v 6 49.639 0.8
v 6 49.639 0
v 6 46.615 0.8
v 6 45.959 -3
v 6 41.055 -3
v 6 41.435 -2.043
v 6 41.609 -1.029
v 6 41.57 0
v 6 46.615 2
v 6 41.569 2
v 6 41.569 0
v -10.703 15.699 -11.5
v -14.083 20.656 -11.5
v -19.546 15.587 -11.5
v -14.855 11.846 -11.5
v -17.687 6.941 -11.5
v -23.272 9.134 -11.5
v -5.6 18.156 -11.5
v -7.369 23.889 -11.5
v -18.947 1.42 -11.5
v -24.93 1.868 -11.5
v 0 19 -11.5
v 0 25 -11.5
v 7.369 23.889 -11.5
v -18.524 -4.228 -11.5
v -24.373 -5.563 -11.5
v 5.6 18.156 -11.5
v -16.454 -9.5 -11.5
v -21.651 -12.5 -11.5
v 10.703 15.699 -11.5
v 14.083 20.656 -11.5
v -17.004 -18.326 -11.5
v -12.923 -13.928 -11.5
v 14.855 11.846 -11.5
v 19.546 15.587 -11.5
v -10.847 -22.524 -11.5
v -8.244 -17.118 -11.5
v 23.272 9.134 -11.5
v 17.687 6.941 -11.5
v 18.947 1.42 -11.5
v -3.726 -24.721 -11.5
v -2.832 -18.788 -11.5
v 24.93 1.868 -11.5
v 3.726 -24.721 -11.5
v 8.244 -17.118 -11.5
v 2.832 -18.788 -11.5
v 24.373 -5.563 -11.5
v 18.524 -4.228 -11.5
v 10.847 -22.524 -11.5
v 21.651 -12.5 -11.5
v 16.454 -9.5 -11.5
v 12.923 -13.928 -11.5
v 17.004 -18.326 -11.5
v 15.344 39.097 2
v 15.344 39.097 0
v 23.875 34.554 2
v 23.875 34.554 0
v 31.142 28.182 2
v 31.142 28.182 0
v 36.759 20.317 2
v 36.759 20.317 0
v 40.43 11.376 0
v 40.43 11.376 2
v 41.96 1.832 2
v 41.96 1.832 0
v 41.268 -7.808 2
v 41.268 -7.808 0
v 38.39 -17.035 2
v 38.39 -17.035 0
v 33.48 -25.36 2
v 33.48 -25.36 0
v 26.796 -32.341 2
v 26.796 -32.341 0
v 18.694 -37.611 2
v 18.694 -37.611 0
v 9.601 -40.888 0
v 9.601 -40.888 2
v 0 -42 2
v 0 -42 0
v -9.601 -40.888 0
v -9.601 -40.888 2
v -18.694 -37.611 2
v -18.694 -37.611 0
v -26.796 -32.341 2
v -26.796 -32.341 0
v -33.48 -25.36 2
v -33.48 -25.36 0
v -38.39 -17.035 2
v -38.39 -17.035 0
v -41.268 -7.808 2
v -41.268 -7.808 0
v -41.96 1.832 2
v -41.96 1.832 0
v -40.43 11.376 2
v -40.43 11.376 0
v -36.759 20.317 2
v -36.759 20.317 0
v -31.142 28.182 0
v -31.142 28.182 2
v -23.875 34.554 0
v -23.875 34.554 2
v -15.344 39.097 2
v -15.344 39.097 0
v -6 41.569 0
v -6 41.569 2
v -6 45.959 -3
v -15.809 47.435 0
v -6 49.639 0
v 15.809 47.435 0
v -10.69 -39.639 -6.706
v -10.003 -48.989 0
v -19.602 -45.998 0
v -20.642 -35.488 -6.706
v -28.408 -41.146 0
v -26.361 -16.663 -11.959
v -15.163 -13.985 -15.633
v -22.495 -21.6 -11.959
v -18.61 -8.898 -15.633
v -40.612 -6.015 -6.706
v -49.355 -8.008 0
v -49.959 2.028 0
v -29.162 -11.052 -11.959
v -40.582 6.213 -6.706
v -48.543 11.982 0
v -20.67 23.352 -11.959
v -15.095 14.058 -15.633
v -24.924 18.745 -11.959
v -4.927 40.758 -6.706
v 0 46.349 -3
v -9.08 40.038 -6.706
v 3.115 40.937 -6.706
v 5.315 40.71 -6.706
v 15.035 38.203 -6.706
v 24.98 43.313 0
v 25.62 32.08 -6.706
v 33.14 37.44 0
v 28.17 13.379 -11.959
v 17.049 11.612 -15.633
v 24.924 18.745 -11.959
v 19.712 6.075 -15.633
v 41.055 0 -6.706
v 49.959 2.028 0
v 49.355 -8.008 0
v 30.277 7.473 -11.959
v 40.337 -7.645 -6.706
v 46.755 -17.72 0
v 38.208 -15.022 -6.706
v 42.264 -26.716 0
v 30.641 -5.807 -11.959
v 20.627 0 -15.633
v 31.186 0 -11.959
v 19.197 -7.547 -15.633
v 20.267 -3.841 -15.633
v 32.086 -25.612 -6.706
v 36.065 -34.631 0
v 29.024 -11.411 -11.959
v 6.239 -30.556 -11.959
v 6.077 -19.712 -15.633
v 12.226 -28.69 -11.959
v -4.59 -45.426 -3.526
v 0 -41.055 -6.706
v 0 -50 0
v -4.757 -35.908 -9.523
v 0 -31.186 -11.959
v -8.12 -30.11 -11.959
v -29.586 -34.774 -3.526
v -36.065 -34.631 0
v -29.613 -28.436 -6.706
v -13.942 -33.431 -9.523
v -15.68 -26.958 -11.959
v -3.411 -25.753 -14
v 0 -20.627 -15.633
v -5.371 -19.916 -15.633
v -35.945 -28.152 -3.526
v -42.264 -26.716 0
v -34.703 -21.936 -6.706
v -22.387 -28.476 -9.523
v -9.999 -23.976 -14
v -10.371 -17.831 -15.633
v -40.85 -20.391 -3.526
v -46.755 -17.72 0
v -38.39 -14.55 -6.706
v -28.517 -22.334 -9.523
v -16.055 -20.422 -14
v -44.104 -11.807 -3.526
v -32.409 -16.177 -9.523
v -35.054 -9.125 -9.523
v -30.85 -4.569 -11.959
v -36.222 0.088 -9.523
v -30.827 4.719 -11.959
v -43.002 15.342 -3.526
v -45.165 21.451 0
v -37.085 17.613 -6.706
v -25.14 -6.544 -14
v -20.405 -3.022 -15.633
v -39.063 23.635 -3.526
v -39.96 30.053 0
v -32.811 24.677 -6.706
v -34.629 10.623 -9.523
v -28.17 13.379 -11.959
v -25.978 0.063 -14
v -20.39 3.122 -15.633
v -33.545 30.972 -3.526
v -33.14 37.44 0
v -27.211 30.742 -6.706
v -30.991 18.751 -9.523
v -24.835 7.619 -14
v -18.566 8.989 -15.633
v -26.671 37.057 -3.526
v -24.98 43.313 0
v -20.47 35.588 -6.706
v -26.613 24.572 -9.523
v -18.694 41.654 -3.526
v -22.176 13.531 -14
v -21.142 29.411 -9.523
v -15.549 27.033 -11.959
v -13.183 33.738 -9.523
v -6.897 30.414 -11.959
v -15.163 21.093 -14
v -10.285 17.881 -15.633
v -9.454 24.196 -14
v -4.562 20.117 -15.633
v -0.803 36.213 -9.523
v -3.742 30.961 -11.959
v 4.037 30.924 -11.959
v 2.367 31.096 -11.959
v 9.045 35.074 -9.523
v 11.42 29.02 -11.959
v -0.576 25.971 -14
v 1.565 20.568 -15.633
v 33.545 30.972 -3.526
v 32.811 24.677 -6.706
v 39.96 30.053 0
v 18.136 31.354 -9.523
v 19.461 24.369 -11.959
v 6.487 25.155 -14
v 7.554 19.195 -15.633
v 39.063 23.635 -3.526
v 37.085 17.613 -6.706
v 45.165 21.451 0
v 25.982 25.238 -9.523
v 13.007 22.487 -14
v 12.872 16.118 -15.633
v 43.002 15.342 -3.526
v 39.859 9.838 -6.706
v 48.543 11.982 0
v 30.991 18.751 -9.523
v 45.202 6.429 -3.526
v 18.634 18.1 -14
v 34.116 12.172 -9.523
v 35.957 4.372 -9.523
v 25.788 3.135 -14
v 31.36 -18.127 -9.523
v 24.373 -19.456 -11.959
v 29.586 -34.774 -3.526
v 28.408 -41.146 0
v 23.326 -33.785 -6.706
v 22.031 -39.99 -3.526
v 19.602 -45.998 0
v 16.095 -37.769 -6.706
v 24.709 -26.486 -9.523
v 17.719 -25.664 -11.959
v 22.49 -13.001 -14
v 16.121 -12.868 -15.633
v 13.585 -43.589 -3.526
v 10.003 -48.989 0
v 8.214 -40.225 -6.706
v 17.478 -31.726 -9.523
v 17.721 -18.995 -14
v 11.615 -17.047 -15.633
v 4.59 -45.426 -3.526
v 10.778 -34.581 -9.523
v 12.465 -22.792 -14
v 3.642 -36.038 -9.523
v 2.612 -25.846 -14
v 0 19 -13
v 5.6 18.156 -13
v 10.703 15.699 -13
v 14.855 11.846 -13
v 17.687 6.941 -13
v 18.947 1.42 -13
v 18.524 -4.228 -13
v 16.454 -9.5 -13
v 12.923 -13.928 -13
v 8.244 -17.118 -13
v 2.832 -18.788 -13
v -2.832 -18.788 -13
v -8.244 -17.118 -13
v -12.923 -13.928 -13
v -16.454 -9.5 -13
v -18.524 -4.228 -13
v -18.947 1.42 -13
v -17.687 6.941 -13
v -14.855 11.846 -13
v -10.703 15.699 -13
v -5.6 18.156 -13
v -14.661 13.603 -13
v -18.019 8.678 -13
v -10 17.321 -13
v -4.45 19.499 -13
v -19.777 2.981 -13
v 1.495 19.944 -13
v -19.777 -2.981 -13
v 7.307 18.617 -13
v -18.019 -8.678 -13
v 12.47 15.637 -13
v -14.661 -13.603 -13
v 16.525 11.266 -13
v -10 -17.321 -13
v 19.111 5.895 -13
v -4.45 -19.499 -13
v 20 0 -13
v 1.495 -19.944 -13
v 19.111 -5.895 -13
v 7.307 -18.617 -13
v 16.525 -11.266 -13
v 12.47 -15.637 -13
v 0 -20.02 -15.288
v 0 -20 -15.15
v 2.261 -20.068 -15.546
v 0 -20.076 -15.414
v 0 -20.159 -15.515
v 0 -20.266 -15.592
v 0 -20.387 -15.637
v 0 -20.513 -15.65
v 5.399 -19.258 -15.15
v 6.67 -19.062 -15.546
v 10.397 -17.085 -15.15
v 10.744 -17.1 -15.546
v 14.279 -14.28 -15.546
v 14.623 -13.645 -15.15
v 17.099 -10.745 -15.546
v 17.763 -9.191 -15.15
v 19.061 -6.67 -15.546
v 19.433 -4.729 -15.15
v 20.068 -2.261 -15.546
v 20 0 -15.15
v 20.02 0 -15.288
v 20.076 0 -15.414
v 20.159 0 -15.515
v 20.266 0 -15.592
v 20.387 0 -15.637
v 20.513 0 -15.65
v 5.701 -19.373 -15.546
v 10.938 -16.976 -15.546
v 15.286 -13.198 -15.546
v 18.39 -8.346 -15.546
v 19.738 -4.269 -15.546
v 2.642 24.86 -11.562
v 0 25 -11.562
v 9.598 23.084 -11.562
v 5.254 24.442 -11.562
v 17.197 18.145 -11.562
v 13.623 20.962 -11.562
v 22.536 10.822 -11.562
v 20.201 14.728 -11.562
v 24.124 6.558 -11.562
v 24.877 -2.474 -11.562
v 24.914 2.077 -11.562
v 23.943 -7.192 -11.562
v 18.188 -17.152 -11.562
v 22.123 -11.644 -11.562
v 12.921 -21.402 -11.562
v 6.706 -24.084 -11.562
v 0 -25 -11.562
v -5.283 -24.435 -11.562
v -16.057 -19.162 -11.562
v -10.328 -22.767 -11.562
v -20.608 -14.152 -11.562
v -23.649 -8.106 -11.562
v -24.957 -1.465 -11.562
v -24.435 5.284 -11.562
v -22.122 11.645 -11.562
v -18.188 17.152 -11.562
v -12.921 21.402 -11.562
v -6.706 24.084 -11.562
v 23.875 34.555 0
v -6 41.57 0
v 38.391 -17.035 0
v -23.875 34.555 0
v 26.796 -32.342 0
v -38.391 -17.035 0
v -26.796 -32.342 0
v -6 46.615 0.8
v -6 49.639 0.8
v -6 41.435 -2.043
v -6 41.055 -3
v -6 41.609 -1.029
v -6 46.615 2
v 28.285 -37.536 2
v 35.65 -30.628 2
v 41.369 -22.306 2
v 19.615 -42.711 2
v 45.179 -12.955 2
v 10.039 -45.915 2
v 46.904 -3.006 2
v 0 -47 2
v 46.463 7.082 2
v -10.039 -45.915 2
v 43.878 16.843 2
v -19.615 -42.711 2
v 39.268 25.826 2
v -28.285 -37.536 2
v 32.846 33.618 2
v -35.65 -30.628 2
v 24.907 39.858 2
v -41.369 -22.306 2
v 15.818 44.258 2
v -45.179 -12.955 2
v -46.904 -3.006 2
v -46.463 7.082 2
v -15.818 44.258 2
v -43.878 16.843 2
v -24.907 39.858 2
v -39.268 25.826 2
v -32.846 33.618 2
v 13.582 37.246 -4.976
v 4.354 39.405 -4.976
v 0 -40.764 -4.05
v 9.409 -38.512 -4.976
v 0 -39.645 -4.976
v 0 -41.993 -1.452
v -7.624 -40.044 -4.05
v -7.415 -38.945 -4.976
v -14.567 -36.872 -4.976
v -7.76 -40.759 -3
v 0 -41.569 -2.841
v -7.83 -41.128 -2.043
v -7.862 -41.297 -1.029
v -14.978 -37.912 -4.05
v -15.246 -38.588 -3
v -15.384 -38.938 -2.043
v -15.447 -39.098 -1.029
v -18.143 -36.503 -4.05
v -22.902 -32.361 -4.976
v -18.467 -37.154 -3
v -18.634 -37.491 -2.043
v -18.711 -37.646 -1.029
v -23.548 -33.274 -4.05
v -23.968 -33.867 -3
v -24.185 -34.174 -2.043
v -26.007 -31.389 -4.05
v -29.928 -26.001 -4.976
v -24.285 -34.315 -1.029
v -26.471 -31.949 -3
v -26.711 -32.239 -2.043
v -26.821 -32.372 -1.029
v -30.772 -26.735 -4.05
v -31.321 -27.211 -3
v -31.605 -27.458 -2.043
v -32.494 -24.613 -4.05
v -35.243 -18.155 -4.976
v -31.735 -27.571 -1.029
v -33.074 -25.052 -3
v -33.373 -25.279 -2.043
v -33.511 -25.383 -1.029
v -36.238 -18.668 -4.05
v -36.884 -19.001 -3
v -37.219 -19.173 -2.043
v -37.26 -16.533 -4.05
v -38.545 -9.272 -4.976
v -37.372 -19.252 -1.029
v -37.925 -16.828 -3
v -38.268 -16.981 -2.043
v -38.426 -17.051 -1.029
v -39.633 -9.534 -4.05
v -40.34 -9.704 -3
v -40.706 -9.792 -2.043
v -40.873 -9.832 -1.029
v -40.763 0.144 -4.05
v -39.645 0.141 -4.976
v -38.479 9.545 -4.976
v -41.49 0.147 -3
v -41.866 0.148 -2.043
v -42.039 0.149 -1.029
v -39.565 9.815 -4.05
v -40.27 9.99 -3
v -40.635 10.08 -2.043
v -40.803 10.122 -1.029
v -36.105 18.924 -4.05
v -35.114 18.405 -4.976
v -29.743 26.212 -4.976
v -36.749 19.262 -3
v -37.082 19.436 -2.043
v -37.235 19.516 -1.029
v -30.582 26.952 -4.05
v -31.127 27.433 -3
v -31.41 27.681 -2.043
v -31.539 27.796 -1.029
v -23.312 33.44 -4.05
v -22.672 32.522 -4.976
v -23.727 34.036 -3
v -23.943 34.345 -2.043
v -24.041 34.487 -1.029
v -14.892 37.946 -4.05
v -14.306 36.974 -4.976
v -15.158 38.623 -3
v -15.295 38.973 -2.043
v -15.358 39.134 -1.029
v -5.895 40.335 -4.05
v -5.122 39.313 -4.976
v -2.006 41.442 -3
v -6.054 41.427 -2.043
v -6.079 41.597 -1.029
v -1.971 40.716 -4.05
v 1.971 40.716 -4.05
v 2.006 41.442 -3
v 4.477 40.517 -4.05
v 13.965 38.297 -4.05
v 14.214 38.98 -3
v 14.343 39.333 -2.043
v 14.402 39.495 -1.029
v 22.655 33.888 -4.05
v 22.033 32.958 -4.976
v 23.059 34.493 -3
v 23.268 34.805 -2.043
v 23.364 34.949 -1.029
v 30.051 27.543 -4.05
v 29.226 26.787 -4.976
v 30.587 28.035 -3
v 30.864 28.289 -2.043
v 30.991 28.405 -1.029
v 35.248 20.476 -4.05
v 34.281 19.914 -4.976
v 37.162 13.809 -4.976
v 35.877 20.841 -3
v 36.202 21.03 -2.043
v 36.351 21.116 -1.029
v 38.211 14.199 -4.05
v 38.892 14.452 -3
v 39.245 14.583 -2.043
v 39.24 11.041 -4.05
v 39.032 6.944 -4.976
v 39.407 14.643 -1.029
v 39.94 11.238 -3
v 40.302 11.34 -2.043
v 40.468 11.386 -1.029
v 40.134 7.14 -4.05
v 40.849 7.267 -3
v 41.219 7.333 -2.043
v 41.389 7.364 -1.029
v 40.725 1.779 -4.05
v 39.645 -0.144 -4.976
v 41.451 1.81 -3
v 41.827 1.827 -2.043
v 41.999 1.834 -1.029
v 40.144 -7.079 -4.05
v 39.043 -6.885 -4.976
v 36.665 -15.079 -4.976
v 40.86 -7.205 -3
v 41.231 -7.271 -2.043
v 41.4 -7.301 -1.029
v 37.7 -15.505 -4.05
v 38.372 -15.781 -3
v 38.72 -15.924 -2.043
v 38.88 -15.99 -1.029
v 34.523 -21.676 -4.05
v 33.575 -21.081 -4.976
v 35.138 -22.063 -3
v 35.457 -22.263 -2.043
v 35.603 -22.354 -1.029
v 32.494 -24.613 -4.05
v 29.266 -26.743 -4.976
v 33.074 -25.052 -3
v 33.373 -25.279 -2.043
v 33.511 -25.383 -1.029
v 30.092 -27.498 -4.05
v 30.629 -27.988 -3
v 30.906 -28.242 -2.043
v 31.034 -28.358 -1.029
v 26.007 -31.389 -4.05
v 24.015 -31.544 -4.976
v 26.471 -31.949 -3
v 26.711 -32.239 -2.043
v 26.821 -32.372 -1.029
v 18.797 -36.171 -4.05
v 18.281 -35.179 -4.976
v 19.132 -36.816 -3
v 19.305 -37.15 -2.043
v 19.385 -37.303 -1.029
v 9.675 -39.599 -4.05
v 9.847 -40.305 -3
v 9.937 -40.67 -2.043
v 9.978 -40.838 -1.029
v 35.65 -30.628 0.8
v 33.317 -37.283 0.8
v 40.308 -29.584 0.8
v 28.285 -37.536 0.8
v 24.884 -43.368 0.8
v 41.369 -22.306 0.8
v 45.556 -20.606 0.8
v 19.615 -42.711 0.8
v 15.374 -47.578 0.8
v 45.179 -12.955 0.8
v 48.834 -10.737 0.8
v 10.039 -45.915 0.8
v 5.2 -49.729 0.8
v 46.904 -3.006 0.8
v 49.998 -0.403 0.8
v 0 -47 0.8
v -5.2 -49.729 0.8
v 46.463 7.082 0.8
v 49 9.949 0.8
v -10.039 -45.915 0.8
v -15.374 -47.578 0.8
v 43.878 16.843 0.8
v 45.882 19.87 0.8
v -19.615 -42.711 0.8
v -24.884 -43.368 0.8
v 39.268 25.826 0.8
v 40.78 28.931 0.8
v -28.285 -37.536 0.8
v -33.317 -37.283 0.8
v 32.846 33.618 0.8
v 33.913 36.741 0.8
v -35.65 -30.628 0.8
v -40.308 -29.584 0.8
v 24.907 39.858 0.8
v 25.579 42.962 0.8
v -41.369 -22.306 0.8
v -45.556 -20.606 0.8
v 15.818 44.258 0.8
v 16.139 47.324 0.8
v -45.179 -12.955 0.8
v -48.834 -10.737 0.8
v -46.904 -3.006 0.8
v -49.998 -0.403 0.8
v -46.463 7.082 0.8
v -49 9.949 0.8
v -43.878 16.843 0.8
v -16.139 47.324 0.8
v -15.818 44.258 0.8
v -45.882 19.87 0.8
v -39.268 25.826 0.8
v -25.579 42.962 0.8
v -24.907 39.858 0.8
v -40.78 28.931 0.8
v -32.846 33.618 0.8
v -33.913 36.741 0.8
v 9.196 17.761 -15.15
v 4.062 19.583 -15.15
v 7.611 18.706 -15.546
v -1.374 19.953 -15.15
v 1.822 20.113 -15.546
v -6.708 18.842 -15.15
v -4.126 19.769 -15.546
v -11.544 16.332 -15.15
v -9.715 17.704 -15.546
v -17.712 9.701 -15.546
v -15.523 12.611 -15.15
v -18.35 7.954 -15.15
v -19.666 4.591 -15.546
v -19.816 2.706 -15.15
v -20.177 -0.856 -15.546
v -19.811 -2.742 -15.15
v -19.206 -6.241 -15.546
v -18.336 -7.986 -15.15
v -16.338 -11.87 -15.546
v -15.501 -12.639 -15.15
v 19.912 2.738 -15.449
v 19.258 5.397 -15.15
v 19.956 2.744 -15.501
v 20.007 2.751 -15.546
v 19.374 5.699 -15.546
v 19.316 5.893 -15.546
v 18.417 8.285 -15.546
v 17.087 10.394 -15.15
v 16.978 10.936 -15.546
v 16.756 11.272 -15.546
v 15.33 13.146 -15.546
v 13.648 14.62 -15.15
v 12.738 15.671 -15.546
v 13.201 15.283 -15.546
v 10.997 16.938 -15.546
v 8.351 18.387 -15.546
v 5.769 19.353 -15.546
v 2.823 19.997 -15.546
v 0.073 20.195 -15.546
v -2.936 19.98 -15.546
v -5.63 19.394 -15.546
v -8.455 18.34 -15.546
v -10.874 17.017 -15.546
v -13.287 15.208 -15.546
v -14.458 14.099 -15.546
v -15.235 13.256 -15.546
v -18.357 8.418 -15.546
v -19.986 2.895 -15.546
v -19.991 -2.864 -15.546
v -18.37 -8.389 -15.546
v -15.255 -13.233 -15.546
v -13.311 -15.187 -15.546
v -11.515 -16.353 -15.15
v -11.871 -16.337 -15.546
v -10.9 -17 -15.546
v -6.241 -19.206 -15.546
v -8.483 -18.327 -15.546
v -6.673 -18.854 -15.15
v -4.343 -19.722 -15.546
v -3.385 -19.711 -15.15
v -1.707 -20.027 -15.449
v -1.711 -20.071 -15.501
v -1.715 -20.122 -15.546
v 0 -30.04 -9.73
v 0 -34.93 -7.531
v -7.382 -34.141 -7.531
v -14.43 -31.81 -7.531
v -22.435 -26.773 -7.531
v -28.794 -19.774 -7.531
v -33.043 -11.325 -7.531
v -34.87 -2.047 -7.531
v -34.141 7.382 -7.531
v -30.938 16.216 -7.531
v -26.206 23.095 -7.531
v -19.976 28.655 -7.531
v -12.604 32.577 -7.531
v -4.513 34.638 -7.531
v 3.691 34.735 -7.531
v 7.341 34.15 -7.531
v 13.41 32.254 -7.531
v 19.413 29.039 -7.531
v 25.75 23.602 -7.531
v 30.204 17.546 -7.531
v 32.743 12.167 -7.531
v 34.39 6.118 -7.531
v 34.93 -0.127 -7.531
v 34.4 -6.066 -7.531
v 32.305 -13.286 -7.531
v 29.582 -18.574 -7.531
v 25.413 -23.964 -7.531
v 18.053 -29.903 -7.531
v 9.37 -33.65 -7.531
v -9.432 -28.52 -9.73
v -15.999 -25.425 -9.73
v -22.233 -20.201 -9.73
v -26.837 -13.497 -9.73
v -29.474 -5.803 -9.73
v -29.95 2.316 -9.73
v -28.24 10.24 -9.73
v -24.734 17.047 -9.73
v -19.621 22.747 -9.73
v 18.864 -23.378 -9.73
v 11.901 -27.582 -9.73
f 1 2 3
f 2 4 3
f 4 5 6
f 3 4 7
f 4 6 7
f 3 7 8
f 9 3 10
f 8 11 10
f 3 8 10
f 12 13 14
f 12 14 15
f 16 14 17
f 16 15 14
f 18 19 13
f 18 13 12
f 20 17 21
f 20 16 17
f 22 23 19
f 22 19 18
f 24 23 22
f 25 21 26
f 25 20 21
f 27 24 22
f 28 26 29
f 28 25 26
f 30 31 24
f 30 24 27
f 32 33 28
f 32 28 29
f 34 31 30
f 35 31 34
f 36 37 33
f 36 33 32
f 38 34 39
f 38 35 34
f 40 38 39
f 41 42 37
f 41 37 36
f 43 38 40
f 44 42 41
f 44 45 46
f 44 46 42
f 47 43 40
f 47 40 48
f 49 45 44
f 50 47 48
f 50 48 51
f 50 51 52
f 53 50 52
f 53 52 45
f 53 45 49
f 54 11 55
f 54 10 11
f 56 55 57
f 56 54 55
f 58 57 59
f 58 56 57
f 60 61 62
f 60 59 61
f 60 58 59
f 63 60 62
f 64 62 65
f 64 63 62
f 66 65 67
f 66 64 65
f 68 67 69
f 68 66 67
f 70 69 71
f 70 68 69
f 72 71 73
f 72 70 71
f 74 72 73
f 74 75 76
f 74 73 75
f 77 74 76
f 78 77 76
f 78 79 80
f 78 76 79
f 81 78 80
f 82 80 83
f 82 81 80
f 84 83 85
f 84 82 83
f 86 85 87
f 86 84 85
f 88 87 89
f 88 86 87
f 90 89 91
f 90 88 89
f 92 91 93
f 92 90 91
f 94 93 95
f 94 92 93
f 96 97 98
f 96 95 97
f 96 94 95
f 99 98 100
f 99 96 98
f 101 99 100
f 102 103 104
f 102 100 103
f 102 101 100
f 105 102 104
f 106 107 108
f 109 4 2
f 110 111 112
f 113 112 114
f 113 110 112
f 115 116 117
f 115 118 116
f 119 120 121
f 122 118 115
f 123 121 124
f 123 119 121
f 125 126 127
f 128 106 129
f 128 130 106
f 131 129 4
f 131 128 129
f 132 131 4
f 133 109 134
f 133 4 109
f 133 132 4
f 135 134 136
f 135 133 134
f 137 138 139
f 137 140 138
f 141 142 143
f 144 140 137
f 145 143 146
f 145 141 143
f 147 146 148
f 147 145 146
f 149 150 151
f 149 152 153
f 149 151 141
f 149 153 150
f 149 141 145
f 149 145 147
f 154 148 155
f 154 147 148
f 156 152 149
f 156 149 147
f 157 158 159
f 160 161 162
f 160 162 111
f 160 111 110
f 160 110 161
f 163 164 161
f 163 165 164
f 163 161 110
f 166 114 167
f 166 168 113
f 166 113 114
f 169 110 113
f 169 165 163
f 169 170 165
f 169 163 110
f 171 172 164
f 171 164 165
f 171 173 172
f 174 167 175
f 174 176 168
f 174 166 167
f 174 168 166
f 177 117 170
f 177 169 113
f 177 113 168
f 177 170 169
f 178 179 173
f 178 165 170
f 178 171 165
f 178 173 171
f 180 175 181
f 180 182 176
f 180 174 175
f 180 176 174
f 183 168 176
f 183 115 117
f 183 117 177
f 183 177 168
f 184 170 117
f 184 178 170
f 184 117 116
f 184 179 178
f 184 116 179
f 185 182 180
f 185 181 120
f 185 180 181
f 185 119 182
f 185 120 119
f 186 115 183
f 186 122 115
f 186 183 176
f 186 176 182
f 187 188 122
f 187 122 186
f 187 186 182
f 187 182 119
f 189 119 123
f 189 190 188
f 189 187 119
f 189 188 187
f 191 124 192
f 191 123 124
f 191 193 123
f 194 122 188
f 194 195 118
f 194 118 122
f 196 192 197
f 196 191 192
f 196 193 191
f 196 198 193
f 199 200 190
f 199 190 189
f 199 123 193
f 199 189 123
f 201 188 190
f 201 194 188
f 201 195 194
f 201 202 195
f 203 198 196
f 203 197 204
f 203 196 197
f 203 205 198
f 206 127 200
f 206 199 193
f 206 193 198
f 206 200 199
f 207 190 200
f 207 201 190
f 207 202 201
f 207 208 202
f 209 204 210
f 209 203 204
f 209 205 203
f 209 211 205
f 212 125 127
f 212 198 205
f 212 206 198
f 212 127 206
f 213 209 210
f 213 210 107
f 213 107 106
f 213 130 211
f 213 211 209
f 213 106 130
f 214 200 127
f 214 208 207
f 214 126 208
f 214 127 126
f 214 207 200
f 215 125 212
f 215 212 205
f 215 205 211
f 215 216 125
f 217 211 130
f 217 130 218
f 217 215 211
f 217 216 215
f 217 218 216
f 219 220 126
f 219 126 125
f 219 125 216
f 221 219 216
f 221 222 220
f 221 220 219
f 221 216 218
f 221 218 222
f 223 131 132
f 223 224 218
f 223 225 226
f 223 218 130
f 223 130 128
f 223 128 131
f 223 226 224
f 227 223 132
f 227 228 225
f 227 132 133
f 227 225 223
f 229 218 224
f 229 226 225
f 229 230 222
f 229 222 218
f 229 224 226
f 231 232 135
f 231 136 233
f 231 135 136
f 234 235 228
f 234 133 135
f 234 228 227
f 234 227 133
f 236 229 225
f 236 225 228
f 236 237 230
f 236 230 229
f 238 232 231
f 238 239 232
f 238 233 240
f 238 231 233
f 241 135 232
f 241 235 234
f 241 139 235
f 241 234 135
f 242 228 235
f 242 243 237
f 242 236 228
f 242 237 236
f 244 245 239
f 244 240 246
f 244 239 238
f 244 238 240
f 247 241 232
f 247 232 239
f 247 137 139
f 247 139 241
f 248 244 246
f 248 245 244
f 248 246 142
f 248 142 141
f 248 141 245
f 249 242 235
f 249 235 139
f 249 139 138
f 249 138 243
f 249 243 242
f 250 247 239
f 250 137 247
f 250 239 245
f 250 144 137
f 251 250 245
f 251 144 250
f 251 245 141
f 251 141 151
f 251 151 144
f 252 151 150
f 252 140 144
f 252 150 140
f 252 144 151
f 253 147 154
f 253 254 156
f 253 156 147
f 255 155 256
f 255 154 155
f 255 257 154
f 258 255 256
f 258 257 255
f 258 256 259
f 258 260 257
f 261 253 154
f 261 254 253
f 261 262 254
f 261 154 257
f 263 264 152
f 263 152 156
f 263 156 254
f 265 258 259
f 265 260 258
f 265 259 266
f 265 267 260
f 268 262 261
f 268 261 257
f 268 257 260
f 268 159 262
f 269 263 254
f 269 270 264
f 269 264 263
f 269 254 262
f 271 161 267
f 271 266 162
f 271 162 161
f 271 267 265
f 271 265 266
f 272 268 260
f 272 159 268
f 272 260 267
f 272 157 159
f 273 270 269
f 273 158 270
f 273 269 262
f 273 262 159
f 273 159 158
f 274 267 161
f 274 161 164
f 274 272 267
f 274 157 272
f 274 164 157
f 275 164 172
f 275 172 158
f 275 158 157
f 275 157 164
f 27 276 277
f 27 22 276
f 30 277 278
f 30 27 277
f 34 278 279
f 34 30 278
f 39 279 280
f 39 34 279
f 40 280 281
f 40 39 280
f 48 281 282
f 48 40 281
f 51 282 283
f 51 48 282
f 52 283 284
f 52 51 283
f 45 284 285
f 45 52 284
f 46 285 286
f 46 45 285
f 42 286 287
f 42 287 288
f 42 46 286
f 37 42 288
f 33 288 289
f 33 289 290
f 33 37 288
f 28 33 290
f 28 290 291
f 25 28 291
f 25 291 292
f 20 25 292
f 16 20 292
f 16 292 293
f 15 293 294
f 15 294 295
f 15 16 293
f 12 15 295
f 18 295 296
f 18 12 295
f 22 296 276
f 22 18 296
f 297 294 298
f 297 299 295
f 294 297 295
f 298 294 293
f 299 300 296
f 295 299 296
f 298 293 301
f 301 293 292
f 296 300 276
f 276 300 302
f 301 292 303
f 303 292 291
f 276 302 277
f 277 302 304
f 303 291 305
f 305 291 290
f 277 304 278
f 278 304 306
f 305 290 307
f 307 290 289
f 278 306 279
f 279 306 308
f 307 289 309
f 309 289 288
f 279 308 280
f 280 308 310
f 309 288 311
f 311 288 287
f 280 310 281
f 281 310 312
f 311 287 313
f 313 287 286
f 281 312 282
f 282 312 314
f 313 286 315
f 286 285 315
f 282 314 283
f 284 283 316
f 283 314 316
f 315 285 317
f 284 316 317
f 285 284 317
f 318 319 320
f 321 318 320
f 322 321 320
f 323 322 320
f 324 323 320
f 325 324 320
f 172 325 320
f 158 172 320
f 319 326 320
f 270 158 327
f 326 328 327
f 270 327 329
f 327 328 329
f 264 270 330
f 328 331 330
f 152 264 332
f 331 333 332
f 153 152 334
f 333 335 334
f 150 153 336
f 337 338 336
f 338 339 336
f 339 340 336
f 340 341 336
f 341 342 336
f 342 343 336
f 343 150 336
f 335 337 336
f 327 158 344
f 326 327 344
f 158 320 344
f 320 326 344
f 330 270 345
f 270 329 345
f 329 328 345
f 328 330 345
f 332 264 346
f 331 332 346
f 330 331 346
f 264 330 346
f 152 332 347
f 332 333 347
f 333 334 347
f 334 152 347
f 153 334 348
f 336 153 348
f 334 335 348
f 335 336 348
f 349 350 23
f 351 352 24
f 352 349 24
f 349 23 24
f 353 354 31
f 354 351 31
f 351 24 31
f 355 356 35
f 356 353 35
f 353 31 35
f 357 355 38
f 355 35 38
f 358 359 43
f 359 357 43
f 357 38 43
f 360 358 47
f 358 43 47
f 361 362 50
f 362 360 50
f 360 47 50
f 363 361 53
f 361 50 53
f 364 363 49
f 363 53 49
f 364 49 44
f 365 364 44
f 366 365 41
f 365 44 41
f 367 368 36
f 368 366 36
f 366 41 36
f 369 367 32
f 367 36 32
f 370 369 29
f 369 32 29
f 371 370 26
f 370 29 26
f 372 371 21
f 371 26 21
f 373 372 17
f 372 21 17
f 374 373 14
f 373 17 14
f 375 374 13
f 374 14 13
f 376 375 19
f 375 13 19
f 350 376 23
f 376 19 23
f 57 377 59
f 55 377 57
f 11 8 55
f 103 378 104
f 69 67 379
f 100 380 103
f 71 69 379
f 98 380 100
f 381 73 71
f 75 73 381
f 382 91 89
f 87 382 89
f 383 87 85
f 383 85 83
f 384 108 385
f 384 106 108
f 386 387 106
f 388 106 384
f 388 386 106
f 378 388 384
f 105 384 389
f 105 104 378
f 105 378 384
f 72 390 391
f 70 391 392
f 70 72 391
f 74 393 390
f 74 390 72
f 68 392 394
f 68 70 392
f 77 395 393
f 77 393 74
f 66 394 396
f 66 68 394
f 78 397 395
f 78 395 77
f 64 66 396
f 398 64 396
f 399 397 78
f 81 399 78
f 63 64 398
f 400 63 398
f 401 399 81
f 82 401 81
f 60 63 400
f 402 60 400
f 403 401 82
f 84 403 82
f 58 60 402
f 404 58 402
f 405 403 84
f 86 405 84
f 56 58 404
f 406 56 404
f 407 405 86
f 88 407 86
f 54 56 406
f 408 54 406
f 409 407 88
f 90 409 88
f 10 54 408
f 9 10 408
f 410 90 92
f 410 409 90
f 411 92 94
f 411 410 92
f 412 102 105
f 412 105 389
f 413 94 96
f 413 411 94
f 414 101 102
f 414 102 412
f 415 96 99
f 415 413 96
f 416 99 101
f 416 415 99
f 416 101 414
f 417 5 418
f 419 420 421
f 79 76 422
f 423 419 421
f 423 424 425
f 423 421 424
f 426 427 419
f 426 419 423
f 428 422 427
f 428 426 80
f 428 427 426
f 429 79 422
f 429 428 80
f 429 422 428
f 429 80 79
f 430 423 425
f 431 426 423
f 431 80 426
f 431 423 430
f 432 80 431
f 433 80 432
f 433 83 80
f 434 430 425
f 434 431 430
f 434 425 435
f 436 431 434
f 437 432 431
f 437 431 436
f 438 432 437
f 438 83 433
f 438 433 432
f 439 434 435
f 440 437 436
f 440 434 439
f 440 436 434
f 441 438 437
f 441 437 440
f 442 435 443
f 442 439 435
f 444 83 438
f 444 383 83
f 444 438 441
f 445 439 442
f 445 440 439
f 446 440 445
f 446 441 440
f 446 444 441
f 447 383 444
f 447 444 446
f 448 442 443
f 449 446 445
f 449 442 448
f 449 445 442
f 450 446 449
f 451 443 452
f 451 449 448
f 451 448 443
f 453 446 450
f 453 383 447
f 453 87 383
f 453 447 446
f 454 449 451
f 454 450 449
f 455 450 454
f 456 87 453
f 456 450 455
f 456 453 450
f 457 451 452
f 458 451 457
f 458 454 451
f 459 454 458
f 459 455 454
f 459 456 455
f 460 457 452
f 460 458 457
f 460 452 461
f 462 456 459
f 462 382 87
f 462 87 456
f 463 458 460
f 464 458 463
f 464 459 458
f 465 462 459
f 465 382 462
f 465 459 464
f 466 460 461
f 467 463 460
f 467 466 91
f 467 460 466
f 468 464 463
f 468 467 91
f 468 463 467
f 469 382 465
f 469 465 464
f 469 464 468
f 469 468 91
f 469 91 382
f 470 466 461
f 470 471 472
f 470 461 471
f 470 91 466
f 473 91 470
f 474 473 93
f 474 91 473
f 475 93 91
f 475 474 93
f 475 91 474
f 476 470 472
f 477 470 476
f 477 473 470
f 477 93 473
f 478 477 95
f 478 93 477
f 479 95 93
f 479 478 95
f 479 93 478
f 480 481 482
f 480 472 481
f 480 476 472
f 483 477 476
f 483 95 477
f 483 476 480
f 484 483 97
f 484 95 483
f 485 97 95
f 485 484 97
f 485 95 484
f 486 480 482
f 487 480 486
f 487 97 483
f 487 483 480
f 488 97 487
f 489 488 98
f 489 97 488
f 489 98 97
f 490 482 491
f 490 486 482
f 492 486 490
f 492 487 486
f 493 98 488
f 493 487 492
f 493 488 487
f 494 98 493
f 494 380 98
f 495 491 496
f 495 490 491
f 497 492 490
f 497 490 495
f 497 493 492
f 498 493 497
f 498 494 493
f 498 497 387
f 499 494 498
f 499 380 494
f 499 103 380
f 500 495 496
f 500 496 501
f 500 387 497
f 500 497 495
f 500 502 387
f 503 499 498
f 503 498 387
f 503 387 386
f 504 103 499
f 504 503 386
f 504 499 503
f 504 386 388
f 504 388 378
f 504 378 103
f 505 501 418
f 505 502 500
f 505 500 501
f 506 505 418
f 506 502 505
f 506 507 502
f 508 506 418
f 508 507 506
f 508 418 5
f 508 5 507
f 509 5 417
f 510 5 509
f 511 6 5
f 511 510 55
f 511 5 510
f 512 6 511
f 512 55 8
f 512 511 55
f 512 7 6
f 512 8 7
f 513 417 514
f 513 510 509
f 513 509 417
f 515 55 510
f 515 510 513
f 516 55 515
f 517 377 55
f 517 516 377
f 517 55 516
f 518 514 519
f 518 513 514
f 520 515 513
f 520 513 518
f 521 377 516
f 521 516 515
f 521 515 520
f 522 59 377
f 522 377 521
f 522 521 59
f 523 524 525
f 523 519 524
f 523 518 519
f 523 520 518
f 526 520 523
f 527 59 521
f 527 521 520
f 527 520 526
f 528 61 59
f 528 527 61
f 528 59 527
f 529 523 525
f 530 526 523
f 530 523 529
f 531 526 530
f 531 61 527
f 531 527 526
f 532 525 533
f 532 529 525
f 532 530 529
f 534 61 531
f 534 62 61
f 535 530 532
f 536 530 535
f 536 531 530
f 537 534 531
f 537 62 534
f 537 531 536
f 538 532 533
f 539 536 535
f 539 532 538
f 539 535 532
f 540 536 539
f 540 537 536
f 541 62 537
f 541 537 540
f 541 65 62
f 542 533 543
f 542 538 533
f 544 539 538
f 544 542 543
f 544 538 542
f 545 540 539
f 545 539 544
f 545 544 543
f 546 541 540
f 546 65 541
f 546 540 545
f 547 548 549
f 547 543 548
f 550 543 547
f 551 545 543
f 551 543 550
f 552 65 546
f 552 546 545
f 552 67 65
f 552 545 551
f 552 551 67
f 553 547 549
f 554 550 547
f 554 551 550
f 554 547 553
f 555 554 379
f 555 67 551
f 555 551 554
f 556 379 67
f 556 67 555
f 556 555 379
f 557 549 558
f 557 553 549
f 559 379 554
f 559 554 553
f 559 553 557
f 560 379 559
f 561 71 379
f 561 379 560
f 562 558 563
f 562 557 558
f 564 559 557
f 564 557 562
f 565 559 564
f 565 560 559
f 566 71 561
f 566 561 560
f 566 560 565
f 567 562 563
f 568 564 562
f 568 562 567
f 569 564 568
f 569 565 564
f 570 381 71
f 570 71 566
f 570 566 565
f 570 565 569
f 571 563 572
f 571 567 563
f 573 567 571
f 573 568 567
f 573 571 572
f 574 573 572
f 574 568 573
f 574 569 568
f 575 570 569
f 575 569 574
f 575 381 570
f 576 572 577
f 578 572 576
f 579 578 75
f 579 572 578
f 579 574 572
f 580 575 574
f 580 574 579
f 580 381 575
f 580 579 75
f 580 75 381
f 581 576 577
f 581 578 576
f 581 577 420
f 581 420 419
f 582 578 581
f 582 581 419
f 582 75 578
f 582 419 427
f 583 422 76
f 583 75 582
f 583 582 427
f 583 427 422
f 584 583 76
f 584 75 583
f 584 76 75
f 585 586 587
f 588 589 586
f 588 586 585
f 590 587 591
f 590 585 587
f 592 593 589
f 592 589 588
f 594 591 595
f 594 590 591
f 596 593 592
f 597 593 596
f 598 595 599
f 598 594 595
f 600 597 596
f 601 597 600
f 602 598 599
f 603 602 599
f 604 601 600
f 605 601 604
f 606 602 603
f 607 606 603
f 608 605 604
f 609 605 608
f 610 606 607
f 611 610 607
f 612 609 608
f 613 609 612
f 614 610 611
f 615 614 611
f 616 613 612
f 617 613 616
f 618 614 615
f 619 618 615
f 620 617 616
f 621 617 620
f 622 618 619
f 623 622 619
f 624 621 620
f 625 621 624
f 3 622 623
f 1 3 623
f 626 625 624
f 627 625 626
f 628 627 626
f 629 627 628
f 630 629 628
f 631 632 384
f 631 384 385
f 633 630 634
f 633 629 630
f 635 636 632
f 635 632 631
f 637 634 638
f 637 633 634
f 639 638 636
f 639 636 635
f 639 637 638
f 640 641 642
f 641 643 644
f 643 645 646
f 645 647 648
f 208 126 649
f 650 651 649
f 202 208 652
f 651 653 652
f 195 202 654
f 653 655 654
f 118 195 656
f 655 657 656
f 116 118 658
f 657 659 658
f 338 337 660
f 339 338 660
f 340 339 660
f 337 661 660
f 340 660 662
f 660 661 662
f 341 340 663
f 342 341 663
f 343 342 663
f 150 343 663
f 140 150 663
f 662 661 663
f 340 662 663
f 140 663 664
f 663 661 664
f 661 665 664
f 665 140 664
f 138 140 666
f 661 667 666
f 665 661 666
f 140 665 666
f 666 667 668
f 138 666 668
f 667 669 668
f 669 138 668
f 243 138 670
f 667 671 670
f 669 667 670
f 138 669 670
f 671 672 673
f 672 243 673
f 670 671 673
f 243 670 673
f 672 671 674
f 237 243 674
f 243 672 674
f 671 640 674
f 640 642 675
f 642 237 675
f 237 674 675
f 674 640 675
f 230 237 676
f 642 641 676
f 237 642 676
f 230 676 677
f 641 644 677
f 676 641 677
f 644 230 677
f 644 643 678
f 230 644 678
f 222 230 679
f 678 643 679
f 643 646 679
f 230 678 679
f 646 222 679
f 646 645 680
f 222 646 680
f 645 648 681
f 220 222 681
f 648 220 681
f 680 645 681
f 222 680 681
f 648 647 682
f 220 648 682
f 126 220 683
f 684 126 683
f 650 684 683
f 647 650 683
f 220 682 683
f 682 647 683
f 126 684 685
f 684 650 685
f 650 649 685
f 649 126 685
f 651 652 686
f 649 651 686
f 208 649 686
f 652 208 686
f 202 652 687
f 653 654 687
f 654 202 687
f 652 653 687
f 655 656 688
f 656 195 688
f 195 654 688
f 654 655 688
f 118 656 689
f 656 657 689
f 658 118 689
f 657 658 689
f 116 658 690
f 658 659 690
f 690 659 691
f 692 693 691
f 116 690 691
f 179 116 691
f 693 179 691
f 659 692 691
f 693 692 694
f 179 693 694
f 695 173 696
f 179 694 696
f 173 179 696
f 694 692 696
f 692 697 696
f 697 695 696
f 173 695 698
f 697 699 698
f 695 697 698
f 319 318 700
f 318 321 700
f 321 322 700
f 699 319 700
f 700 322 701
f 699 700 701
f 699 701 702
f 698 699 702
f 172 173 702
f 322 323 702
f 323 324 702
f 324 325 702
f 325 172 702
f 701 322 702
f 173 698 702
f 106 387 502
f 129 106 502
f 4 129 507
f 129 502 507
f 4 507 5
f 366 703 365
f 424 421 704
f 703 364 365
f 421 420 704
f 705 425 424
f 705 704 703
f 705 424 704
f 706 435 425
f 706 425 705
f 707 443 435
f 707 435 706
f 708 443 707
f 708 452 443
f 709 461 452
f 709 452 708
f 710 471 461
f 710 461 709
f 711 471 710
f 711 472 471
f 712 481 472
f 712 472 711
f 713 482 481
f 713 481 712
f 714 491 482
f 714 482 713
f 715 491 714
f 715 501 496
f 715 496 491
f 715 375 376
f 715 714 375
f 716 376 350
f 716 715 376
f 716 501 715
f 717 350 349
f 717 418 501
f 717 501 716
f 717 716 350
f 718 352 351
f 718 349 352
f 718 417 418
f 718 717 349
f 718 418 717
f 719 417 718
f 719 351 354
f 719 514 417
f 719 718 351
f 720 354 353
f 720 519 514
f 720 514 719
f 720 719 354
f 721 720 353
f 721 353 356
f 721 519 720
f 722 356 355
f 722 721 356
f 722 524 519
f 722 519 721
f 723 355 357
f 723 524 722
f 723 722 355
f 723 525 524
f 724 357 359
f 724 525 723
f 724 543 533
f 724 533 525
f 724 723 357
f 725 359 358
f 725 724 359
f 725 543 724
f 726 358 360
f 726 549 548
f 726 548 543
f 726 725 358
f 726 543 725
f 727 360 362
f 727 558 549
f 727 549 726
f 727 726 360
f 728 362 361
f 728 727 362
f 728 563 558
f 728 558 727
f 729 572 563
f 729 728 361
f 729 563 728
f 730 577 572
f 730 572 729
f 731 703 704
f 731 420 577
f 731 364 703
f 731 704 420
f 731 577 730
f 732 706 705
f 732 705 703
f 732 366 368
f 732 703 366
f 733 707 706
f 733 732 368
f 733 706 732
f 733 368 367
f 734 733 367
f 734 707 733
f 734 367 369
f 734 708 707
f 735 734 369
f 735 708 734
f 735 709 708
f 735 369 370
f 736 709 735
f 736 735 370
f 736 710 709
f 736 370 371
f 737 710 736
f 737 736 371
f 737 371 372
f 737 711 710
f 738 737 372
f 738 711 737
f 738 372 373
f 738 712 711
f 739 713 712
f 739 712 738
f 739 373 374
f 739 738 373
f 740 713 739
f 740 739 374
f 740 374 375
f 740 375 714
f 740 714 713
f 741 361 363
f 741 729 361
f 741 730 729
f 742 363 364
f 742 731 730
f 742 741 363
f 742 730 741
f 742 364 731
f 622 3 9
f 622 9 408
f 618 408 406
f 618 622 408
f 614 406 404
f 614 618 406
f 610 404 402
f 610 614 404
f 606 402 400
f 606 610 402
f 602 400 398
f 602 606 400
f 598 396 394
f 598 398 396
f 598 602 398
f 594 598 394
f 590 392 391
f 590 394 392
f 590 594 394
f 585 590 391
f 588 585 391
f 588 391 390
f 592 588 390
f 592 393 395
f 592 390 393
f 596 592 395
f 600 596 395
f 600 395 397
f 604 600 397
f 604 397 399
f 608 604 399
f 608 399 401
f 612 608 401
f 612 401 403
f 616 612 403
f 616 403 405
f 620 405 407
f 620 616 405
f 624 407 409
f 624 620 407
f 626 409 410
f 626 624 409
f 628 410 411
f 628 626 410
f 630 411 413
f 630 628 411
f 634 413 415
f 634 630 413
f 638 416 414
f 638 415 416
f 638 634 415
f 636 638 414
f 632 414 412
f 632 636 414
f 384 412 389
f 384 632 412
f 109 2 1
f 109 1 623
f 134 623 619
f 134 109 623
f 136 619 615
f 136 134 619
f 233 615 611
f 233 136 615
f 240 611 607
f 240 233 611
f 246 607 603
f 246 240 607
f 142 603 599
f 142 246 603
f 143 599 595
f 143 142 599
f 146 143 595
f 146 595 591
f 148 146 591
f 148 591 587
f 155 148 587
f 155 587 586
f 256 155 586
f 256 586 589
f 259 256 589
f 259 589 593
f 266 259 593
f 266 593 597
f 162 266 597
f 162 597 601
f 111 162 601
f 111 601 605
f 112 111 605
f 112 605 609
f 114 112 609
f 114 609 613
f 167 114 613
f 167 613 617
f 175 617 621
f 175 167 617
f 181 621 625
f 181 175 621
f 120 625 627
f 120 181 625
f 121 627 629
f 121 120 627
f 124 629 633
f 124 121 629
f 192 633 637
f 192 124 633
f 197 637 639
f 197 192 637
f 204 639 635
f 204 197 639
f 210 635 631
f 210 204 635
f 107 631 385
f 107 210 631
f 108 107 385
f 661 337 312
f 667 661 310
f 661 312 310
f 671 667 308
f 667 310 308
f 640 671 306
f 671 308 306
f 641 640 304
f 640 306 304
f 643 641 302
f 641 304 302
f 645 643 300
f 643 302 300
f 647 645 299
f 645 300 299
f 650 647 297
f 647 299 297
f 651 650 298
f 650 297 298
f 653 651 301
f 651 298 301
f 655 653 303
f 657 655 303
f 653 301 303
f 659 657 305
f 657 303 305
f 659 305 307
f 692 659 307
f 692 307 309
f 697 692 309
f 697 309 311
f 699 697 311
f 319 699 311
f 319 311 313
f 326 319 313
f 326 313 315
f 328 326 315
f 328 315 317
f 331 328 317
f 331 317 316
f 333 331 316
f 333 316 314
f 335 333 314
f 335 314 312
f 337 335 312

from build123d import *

# Parameters (mm, degrees)
F2_R     = 20
F3_DEPTH = 25
F4_R     = 2.5
F5_DEPTH = 25
F7_W     = 12
F7_H     = 6.6
F8_DEPTH = 60
F10_R    = 0.5
F9_W     = 6
F9_H     = 1.5


# Not quite as in the source:
# - a fillet or chamfer that OpenCascade refuses, or shapes differently, is made with other operations: its cross-section is extruded or revolved along the edge and cut away or added
# - a feature names something its author has since deleted; it is built from what else it names


with BuildPart() as f1:
    # F0 (on Right) → F1 (revolve)
    with BuildSketch(Plane.YZ):
        with BuildLine():
            ThreePointArc((0, -15), (-24.8151535342, -11.6208144071), (-47, 0))
            Line((-47, 0), (-42, 0))
            Line((-42, 0), (-42, 2))
            Line((-42, 2), (-47, 2))
            Line((-47, 2), (-47, 0.8))
            Line((-47, 0.8), (-50, 0.8))
            Line((-50, 0.8), (-50, 0))
            ThreePointArc((-50, 0), (-26.7070061906, -13.7416838627), (0, -18))
            Line((0, -18), (0, -15))
        make_face()
    revolve(axis=Axis((0, 0, -9), (0, 0, -1)))

    # F2 (on Top) → F3 (cut)
    with BuildSketch(Plane.XY):
        Circle(F2_R)
    extrude(amount=-F3_DEPTH, mode=Mode.SUBTRACT)

    # F4 (on Top) → F5 (cut)
    with BuildSketch(Plane.XY):
        with Locations((0, -26)):
            Circle(F4_R)
        with Locations((-22.5166604984, 13)):
            Circle(F4_R)
        with Locations((22.5166604984, 13)):
            Circle(F4_R)
    extrude(amount=F5_DEPTH, mode=Mode.SUBTRACT)

    # F6: fillet of radius 5 on 1 edges, made by hand

    # F6_s1 → F6_t2 (revolve)
    with BuildSketch(Plane.YZ):
        with BuildLine():
            ThreePointArc((-39.5886862508, -5.0098655294), (-41.5550423226, -2.8709998558), (-42.0003960381, 5.61589e-05))
            Line((-42.0003960381, 5.61589e-05), (-42.4955021036, 0.0702630102))
            ThreePointArc((-42.4955021036, 0.0702630102), (-44.5001980191, 0.5000590146), (-47, 0.5000590146))
            Line((-47, 0.5000590146), (-47.3050550292, -0.3962328195))
            ThreePointArc((-47.3050550292, -0.3962328195), (-43.6515985166, -3.0334873639), (-39.8426213376, -5.4406508469))
            Line((-39.8426213376, -5.4406508469), (-39.5886862508, -5.0098655294))
        make_face()
    revolve(axis=Axis((0, 0, 0), (0, 0, -1)))

    # F7 (on Front) → F8 (cut)
    with BuildSketch(Plane.XZ):
        with Locations((0, 0.3)):
            Rectangle(F7_W, F7_H)
    extrude(amount=-F8_DEPTH, mode=Mode.SUBTRACT)

    # F10
    f10_edges = [f1.edges().sort_by_distance(p)[0] for p in [
        (-14.142136, 14.142136, -15.795876),
        (14.142136, -14.142136, -15.795876),
    ]]
    fillet(f10_edges, radius=F10_R)

    # F9 (on Right) → F11 (revolve)
    with BuildSketch(Plane.YZ):
        with Locations((22, -12.25)):
            Rectangle(F9_W, F9_H)
    revolve(axis=Axis((0, 0, -5.7836989872), (0, 0, -1)))


solid = f1.part
